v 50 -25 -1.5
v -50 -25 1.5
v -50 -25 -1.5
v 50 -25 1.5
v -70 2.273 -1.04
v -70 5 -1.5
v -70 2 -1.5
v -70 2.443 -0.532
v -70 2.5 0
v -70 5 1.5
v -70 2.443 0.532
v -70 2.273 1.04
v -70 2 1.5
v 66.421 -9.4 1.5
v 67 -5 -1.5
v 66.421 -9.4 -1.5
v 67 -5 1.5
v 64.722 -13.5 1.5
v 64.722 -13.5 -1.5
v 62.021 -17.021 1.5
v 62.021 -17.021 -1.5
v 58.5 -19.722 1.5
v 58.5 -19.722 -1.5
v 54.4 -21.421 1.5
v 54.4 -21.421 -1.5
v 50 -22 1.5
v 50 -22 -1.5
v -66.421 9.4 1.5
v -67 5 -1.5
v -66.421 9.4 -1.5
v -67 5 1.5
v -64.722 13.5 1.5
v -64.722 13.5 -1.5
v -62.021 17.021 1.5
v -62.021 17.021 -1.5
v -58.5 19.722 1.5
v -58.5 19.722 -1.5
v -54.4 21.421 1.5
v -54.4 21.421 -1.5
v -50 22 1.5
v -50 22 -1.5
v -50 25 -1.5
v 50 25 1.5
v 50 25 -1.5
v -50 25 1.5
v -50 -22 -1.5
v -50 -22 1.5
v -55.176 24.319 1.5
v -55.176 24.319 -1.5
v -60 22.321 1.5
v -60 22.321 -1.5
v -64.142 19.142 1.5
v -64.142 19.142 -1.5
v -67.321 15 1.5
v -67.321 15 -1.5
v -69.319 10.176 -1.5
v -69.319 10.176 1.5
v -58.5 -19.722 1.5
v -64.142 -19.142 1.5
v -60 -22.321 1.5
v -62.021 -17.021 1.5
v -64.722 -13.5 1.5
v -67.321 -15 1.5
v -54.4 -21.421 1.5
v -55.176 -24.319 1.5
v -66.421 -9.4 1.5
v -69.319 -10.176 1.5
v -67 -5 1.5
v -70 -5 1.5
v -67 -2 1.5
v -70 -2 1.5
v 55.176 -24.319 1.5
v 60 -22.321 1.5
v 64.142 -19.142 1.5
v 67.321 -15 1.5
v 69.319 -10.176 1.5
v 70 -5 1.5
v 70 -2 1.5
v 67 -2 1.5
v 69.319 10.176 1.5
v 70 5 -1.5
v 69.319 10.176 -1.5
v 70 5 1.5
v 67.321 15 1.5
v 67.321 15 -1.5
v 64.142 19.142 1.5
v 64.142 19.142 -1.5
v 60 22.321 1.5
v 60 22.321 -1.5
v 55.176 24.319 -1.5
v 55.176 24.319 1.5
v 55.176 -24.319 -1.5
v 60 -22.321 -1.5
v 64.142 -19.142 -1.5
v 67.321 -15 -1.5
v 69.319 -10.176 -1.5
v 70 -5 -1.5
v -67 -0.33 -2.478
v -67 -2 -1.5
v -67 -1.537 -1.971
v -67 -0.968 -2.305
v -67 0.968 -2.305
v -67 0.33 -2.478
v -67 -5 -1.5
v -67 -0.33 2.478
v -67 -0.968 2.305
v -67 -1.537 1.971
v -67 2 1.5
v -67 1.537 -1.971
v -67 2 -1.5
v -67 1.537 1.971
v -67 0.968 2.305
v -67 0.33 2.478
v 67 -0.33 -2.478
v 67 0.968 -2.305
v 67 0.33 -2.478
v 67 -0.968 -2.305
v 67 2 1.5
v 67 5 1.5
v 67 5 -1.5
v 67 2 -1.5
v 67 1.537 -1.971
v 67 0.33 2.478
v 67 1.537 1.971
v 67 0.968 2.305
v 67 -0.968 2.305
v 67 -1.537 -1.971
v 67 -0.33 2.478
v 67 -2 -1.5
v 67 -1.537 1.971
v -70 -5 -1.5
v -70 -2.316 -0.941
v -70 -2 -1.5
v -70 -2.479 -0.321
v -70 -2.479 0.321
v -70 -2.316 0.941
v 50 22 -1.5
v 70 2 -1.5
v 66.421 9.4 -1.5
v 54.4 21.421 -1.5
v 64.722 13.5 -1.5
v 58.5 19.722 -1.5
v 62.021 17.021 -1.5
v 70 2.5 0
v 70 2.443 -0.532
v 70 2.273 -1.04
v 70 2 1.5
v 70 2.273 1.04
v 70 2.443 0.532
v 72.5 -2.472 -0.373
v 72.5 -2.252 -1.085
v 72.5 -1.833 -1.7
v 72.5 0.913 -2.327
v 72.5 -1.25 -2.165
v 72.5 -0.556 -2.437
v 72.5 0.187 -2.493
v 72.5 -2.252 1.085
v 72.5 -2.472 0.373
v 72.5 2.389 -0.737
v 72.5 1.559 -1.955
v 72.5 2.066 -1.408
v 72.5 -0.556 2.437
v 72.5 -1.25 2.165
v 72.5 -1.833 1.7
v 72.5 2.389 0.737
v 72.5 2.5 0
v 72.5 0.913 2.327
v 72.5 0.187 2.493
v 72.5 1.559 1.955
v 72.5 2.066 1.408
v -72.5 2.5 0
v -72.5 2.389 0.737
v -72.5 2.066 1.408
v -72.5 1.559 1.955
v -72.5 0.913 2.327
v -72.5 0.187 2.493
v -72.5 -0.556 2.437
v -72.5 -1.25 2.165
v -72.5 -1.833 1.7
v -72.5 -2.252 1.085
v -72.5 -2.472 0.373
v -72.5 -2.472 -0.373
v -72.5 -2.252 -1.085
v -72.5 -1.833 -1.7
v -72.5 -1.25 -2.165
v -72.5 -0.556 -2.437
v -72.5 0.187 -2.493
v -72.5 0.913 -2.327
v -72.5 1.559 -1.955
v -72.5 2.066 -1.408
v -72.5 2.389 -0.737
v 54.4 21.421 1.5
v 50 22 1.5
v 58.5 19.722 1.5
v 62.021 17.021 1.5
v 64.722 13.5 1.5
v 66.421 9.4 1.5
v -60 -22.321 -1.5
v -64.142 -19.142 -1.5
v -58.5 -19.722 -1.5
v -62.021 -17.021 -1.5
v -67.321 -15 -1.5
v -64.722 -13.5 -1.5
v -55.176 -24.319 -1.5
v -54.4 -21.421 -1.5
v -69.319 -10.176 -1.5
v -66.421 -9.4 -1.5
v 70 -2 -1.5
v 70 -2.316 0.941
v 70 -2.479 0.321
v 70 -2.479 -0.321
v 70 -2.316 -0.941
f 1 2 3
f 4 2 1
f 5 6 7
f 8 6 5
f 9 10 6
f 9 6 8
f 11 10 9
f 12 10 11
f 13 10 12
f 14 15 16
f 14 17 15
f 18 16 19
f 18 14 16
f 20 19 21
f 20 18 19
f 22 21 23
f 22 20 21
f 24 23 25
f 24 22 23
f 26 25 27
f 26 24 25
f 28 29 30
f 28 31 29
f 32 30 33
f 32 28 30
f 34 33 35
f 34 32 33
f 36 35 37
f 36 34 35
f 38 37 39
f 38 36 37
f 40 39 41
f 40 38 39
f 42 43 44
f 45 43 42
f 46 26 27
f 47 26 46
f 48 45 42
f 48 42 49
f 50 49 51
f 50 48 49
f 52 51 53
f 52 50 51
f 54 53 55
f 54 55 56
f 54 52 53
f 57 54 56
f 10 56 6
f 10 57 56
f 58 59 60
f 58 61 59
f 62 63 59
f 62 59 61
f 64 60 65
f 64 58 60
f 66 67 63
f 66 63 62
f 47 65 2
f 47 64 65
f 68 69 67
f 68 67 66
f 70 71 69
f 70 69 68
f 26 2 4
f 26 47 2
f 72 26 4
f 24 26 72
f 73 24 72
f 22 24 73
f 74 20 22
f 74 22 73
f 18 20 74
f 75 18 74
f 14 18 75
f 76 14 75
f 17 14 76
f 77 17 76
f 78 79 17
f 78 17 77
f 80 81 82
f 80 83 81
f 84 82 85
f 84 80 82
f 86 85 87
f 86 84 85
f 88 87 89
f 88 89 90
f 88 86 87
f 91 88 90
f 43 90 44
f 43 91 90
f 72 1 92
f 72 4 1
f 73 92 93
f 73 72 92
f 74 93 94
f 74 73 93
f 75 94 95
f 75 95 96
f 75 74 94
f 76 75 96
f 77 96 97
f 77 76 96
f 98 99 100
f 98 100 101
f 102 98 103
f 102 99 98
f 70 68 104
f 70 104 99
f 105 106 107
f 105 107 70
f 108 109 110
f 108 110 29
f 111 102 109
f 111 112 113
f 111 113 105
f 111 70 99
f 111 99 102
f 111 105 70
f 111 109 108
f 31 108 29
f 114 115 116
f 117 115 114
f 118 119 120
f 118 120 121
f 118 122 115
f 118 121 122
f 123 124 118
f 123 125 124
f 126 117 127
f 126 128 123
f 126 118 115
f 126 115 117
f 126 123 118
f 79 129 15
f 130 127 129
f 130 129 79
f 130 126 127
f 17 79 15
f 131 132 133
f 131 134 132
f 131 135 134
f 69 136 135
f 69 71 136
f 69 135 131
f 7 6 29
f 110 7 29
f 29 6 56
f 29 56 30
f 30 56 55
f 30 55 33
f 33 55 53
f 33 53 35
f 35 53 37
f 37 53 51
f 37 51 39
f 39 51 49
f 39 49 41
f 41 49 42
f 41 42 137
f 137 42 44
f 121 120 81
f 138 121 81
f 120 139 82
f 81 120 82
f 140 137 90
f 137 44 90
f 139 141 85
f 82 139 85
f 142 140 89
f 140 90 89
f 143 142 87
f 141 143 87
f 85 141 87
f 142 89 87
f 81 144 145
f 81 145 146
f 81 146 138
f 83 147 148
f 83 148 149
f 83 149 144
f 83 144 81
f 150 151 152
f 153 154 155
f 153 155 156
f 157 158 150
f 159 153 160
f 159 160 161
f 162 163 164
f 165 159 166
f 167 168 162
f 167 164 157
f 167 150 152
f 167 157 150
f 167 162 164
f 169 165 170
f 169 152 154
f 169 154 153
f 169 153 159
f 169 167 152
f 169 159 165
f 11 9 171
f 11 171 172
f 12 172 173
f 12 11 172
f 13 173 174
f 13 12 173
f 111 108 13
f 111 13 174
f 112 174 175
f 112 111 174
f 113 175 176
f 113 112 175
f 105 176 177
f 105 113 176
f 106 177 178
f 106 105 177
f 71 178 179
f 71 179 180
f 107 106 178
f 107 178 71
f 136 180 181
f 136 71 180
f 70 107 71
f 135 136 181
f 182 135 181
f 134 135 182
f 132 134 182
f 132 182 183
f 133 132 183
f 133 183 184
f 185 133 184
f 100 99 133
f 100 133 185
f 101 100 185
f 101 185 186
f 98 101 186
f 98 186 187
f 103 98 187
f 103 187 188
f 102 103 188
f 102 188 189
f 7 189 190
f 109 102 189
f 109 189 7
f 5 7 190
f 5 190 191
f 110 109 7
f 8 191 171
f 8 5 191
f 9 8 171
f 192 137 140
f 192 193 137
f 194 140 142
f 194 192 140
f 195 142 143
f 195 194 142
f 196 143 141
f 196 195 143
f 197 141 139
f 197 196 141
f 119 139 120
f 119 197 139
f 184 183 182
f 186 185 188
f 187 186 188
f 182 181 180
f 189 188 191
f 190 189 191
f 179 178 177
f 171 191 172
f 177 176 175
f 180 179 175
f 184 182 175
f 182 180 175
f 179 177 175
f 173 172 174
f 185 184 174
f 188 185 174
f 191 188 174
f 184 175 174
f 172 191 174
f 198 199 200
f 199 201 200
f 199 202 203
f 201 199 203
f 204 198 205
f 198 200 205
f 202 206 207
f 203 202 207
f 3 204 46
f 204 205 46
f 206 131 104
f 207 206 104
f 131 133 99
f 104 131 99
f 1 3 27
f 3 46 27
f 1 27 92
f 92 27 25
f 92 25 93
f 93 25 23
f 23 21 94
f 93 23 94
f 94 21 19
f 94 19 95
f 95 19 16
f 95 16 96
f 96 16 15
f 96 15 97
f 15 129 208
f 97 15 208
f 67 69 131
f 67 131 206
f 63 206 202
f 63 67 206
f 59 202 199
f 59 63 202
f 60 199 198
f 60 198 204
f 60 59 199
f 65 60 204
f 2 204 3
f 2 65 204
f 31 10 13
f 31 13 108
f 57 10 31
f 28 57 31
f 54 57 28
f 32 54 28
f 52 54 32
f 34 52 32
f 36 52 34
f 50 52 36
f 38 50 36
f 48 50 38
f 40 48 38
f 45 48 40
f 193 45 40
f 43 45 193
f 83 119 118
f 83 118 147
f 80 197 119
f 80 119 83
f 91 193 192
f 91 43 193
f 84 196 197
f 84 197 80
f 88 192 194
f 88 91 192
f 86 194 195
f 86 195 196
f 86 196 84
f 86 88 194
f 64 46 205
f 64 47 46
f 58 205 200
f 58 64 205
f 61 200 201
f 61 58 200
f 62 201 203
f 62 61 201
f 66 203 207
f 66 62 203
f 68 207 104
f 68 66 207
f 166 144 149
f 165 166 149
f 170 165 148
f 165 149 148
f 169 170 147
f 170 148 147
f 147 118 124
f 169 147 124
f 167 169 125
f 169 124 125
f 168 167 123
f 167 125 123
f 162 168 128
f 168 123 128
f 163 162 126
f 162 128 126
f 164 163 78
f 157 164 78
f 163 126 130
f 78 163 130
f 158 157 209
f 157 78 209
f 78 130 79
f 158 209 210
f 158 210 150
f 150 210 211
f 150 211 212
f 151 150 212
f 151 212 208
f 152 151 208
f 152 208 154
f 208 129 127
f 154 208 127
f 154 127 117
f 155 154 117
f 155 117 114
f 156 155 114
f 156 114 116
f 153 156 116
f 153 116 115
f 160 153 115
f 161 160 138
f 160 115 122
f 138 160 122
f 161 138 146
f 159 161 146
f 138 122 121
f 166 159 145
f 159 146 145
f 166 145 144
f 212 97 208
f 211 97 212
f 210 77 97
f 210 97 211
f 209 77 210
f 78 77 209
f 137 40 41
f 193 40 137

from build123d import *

# Parameters (mm, degrees)
F1_DEPTH = 1.5
F2_R     = 2.5
F3_DEPTH = 72.5
F4_DEPTH = 67


with BuildPart() as f1:
    # F0 (on Top) → F1 (new body, symmetric)
    with BuildSketch(Plane.XY):
        with BuildLine():
            Line((50, 25), (-50, 25))
            ThreePointArc((-50, 25), (-64.1421356237, 19.1421356237), (-70, 5))
            Line((-70, 5), (-70, -5))
            ThreePointArc((-70, -5), (-64.1421356237, -19.1421356237), (-50, -25))
            Line((-50, -25), (50, -25))
            ThreePointArc((50, -25), (64.1421356237, -19.1421356237), (70, -5))
            Line((70, -5), (70, 5))
            ThreePointArc((70, 5), (64.1421356237, 19.1421356237), (50, 25))
        make_face()
        with BuildLine():
            Line((-67, -5), (-67, 5))
            ThreePointArc((-67, 5), (-62.0208152802, 17.0208152802), (-50, 22))
            Line((-50, 22), (50, 22))
            ThreePointArc((50, 22), (62.0208152802, 17.0208152802), (67, 5))
            Line((67, 5), (67, -5))
            ThreePointArc((67, -5), (62.0208152802, -17.0208152802), (50, -22))
            Line((50, -22), (-50, -22))
            ThreePointArc((-50, -22), (-62.0208152802, -17.0208152802), (-67, -5))
        make_face(mode=Mode.SUBTRACT)
    extrude(amount=F1_DEPTH, both=True)

    # F2 (on Right) → F3 (join)
    with BuildSketch(Plane.YZ):
        Circle(F2_R)
    extrude(amount=F3_DEPTH)

    # F2 (on Right) → F4 (cut, through all)
    with BuildSketch(Plane.YZ):
        Circle(F2_R)
    extrude(amount=F4_DEPTH, mode=Mode.SUBTRACT)

    # F5: F1 across plane


with BuildPart() as f1_1:
    add(f1.part)
    add(f1.part.mirror(Plane.YZ))


solid = f1_1.part
